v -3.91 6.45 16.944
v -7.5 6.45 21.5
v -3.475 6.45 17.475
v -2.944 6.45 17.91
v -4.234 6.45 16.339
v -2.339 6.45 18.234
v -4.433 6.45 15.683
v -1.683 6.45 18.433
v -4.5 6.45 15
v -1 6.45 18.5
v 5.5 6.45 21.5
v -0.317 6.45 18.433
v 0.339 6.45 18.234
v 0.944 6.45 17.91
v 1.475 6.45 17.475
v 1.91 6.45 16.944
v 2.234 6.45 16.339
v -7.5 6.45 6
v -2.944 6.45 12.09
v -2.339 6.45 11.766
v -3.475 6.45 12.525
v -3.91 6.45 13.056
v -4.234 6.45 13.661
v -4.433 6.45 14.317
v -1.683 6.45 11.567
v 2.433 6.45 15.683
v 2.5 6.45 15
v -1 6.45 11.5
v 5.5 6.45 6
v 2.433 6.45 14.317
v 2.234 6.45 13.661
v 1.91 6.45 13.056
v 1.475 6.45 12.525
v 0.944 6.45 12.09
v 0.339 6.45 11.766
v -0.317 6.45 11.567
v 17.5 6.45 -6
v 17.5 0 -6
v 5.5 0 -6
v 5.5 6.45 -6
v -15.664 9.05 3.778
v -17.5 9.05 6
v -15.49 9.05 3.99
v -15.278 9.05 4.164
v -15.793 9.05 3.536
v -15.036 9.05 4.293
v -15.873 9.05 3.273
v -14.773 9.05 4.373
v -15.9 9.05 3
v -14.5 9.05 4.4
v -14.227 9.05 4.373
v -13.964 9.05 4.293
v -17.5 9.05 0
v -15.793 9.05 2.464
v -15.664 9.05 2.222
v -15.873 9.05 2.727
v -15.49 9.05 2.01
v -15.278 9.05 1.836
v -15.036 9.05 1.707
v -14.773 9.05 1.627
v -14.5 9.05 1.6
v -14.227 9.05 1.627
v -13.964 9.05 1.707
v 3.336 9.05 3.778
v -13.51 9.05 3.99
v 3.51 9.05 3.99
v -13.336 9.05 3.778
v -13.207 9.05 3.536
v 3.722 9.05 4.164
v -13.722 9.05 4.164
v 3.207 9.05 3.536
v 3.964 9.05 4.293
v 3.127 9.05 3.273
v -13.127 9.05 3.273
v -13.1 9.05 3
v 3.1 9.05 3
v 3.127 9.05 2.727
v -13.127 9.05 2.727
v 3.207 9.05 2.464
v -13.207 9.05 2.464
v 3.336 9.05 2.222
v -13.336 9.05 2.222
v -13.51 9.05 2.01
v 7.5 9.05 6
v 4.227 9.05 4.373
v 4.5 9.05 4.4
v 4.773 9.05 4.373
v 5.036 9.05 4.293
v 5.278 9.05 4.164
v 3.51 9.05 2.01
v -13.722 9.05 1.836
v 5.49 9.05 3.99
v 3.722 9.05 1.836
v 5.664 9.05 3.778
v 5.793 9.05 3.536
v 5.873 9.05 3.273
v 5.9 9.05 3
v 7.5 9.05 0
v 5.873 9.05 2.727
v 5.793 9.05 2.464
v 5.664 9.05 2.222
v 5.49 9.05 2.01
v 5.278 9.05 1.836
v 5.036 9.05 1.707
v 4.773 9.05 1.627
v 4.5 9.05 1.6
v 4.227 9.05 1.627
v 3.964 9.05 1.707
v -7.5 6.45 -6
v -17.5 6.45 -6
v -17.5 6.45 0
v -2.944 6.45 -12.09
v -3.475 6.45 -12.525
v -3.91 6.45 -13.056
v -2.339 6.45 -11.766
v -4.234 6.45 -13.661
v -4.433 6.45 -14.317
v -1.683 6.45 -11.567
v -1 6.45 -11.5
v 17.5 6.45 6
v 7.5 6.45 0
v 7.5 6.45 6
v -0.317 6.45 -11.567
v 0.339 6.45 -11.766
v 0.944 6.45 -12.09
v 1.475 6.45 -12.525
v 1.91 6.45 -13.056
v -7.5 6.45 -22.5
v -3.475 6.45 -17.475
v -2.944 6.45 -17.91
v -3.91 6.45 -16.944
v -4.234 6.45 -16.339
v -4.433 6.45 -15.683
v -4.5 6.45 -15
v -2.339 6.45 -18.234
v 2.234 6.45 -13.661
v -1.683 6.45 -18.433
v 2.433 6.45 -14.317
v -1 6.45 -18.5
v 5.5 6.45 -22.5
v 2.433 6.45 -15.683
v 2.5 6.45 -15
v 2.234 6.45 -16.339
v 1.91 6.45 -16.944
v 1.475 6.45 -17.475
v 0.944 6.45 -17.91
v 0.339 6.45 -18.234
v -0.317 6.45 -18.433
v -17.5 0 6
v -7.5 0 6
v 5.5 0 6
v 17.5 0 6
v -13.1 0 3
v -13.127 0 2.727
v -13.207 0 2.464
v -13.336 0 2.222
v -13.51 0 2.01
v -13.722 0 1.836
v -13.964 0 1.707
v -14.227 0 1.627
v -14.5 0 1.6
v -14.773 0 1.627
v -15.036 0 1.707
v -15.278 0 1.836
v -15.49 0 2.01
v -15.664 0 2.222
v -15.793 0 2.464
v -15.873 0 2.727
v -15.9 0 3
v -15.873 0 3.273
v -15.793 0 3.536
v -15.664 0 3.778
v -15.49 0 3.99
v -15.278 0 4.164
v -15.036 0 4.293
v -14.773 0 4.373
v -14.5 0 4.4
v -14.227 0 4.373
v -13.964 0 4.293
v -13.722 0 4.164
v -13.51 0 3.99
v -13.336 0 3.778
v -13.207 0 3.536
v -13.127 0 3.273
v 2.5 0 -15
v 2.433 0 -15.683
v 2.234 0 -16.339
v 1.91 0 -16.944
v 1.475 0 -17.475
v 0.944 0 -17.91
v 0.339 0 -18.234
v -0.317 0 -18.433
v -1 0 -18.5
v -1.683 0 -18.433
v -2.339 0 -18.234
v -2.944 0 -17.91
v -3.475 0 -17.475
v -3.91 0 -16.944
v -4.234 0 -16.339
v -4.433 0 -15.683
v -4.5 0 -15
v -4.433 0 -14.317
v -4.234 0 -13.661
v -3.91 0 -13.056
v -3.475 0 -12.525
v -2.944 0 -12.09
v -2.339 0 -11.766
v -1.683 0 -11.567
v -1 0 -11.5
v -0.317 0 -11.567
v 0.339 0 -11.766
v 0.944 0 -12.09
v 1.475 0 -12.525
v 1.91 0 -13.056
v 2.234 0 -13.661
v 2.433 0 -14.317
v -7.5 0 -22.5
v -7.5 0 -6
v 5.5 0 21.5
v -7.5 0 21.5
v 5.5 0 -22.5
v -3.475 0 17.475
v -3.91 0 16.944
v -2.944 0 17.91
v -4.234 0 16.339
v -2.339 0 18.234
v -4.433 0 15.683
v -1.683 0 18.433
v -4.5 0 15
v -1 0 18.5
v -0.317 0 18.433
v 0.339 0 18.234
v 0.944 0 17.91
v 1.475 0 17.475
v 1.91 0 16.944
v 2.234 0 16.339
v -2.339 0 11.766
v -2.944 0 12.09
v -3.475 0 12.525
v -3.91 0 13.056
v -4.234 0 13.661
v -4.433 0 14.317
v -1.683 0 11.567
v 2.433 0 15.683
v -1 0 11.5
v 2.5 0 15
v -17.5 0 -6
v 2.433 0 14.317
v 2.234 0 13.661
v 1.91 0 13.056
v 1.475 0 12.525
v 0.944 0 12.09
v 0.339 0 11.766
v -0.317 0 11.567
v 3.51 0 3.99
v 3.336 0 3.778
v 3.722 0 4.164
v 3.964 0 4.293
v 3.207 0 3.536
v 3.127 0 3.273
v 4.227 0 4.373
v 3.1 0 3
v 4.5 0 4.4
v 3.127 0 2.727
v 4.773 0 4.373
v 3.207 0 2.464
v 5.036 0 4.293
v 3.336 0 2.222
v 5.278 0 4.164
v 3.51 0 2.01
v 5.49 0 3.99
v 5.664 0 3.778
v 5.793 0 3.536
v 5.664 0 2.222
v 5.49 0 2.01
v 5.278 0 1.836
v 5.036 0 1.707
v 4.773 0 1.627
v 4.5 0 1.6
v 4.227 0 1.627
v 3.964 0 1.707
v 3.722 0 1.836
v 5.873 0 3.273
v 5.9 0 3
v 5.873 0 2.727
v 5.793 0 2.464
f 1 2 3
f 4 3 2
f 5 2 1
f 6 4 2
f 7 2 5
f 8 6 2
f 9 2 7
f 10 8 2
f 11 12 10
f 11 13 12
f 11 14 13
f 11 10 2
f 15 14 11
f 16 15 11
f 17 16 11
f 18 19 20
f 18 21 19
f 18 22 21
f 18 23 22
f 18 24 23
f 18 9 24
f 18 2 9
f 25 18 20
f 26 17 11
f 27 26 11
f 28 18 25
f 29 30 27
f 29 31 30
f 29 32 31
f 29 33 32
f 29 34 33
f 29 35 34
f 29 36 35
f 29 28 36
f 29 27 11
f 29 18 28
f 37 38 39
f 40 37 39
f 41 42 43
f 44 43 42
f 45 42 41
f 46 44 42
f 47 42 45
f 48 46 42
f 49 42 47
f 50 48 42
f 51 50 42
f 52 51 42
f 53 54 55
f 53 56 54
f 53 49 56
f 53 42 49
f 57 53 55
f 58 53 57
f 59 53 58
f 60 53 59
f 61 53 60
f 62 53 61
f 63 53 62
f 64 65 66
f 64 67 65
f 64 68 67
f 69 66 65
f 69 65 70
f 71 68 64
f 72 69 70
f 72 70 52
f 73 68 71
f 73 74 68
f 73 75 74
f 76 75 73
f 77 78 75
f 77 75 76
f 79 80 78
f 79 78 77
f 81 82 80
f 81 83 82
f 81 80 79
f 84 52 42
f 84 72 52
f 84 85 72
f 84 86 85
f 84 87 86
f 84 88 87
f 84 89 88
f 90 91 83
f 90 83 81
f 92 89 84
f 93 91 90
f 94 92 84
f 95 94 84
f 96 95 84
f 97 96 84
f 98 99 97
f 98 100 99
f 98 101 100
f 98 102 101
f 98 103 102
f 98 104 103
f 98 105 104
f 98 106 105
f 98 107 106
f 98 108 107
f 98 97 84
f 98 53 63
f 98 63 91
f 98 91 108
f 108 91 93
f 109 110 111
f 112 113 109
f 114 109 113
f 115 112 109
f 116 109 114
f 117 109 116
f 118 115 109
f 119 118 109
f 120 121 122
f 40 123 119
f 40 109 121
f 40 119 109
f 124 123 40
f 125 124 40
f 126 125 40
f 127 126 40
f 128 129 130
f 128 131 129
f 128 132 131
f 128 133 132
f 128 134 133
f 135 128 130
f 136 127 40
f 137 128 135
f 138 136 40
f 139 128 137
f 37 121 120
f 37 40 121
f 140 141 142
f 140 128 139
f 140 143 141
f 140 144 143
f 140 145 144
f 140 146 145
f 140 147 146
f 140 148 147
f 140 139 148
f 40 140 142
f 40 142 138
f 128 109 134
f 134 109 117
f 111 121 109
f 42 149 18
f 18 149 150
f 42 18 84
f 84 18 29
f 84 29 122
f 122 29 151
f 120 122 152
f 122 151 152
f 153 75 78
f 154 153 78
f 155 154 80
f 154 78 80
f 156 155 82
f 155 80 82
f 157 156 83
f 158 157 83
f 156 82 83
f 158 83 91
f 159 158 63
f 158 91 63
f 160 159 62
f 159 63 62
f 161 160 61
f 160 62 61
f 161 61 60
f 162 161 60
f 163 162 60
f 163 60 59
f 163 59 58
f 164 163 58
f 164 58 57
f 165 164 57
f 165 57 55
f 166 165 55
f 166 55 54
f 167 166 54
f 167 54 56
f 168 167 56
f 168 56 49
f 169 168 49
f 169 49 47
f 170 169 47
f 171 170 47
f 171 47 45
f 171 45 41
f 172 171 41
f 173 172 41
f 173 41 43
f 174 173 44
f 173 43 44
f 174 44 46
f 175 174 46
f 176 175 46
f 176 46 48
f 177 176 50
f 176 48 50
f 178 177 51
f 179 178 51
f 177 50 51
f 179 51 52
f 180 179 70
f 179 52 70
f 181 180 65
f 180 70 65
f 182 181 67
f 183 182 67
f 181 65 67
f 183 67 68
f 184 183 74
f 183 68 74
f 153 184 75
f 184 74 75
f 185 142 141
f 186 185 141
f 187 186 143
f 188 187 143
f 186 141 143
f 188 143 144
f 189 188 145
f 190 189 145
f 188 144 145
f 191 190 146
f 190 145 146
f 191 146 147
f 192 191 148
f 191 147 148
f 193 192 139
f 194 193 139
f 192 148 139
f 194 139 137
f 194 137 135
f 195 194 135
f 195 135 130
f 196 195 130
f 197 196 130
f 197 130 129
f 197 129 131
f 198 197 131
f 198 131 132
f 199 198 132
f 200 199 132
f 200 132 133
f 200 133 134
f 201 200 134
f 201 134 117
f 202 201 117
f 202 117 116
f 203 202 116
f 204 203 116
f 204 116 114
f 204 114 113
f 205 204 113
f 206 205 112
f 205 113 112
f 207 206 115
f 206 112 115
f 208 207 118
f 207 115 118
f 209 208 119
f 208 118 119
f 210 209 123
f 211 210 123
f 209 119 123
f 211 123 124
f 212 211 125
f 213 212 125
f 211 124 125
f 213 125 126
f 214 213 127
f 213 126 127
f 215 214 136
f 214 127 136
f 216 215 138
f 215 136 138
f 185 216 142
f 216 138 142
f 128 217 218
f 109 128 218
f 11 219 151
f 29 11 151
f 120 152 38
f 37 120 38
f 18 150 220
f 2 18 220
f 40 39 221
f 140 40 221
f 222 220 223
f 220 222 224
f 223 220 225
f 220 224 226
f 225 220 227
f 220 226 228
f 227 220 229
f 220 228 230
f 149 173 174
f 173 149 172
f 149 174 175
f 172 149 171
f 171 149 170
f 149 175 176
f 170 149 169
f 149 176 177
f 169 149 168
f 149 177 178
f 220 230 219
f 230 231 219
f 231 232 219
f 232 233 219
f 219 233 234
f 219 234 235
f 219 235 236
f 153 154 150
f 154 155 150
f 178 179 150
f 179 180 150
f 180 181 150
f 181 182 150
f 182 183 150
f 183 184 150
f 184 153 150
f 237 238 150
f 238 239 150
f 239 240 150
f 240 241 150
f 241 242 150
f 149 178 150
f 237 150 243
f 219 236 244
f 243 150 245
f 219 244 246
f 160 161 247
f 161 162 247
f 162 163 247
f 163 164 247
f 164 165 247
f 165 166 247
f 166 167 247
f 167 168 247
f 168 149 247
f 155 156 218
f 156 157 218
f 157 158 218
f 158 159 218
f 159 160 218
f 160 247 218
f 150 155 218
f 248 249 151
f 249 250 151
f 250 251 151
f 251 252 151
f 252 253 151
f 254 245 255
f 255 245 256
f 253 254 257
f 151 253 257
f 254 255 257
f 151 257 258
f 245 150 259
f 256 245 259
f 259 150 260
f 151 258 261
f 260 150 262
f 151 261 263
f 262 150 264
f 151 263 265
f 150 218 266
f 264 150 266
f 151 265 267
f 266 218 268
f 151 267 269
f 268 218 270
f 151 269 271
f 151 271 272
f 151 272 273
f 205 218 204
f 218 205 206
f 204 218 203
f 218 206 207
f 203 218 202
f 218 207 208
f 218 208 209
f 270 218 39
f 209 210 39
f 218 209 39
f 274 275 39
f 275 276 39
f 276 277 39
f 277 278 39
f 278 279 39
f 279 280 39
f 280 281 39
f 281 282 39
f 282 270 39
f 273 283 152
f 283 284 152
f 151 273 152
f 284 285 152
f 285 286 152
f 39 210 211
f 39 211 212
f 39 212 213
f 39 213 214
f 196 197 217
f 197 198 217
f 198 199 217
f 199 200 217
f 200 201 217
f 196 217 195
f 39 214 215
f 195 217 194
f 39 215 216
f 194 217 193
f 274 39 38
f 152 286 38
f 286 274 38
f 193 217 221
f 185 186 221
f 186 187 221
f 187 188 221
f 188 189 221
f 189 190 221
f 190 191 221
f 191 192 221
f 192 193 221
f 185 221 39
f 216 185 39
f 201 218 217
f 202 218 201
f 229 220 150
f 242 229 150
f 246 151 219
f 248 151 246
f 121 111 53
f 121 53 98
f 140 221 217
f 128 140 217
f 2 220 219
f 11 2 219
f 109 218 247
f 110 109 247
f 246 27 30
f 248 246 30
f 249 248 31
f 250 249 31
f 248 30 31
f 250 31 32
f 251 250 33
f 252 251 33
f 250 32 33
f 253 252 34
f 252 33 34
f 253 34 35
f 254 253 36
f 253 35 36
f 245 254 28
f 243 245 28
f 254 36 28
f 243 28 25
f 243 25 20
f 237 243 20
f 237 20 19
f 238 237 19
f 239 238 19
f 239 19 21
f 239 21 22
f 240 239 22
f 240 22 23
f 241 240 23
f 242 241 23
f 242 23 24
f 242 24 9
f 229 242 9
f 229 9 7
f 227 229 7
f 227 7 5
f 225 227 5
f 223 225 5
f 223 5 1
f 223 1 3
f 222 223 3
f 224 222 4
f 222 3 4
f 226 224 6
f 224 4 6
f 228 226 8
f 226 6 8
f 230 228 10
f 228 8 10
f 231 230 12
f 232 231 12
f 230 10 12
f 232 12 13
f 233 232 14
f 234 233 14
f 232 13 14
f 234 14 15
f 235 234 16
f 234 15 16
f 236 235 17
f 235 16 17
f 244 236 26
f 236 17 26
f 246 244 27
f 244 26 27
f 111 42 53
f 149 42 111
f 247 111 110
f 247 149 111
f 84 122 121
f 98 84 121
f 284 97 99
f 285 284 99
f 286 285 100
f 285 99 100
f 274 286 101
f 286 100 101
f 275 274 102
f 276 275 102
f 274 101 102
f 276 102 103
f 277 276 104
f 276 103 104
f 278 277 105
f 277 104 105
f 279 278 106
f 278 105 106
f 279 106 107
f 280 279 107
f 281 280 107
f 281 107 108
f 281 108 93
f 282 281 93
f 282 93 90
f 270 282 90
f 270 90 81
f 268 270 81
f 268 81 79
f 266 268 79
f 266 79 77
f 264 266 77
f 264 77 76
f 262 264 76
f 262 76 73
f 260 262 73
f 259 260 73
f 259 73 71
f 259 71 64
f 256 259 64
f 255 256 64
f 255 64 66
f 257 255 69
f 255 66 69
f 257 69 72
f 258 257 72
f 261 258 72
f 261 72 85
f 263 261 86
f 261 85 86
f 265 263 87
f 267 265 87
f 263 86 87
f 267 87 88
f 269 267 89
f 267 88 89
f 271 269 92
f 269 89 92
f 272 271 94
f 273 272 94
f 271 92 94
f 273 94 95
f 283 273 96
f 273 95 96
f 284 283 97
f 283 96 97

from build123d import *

# Parameters (mm, degrees)
BOSS_EXTRUDE1_DEPTH = 6.45
SKETCH2_W           = 25
SKETCH2_H           = 6
BOSS_EXTRUDE2_DEPTH = 2.6
SKETCH3_R           = 3.5
CUT_EXTRUDE1_DEPTH  = 7.45
SKETCH4_R           = 1.4
CUT_EXTRUDE2_DEPTH  = 10.05


with BuildPart() as part:
    # Sketch1 → Boss-Extrude1 (new body)
    with BuildSketch(Plane(origin=(0, 0, 0), x_dir=(1, 0, 0), z_dir=(0, 1, 0))):
        Polygon((5.5, 6), (5.5, 22.5), (-7.5, 22.5), (-7.5, 6), (-17.5, 6), (-17.5, -6), (-7.5, -6), (-7.5, -21.5), (5.5, -21.5), (5.5, -6), (17.5, -6), (17.5, 6), align=None)
    extrude(amount=BOSS_EXTRUDE1_DEPTH)

    # Sketch2 → Boss-Extrude2 (add)
    with BuildSketch(Plane(origin=(0, 6.45, 0), x_dir=(1, 0, 0), z_dir=(0, 1, 0))):
        with Locations((-5, -3)):
            Rectangle(SKETCH2_W, SKETCH2_H)
    extrude(amount=BOSS_EXTRUDE2_DEPTH)

    # Sketch3 → Cut-Extrude1 (cut, through all)
    with BuildSketch(Plane(origin=(0, 6.45, 0), x_dir=(1, 0, 0), z_dir=(0, 1, 0))):
        with Locations((-1, 15)):
            Circle(SKETCH3_R)
        with Locations((-1, -15)):
            Circle(SKETCH3_R)
    extrude(amount=-CUT_EXTRUDE1_DEPTH, mode=Mode.SUBTRACT)

    # Sketch4 → Cut-Extrude2 (cut, through all)
    with BuildSketch(Plane(origin=(0, 9.05, 0), x_dir=(1, 0, 0), z_dir=(0, 1, 0))):
        with Locations((-14.5, -3)):
            Circle(SKETCH4_R)
        with Locations((4.5, -3)):
            Circle(SKETCH4_R)
    extrude(amount=-CUT_EXTRUDE2_DEPTH, mode=Mode.SUBTRACT)


solid = part.part
